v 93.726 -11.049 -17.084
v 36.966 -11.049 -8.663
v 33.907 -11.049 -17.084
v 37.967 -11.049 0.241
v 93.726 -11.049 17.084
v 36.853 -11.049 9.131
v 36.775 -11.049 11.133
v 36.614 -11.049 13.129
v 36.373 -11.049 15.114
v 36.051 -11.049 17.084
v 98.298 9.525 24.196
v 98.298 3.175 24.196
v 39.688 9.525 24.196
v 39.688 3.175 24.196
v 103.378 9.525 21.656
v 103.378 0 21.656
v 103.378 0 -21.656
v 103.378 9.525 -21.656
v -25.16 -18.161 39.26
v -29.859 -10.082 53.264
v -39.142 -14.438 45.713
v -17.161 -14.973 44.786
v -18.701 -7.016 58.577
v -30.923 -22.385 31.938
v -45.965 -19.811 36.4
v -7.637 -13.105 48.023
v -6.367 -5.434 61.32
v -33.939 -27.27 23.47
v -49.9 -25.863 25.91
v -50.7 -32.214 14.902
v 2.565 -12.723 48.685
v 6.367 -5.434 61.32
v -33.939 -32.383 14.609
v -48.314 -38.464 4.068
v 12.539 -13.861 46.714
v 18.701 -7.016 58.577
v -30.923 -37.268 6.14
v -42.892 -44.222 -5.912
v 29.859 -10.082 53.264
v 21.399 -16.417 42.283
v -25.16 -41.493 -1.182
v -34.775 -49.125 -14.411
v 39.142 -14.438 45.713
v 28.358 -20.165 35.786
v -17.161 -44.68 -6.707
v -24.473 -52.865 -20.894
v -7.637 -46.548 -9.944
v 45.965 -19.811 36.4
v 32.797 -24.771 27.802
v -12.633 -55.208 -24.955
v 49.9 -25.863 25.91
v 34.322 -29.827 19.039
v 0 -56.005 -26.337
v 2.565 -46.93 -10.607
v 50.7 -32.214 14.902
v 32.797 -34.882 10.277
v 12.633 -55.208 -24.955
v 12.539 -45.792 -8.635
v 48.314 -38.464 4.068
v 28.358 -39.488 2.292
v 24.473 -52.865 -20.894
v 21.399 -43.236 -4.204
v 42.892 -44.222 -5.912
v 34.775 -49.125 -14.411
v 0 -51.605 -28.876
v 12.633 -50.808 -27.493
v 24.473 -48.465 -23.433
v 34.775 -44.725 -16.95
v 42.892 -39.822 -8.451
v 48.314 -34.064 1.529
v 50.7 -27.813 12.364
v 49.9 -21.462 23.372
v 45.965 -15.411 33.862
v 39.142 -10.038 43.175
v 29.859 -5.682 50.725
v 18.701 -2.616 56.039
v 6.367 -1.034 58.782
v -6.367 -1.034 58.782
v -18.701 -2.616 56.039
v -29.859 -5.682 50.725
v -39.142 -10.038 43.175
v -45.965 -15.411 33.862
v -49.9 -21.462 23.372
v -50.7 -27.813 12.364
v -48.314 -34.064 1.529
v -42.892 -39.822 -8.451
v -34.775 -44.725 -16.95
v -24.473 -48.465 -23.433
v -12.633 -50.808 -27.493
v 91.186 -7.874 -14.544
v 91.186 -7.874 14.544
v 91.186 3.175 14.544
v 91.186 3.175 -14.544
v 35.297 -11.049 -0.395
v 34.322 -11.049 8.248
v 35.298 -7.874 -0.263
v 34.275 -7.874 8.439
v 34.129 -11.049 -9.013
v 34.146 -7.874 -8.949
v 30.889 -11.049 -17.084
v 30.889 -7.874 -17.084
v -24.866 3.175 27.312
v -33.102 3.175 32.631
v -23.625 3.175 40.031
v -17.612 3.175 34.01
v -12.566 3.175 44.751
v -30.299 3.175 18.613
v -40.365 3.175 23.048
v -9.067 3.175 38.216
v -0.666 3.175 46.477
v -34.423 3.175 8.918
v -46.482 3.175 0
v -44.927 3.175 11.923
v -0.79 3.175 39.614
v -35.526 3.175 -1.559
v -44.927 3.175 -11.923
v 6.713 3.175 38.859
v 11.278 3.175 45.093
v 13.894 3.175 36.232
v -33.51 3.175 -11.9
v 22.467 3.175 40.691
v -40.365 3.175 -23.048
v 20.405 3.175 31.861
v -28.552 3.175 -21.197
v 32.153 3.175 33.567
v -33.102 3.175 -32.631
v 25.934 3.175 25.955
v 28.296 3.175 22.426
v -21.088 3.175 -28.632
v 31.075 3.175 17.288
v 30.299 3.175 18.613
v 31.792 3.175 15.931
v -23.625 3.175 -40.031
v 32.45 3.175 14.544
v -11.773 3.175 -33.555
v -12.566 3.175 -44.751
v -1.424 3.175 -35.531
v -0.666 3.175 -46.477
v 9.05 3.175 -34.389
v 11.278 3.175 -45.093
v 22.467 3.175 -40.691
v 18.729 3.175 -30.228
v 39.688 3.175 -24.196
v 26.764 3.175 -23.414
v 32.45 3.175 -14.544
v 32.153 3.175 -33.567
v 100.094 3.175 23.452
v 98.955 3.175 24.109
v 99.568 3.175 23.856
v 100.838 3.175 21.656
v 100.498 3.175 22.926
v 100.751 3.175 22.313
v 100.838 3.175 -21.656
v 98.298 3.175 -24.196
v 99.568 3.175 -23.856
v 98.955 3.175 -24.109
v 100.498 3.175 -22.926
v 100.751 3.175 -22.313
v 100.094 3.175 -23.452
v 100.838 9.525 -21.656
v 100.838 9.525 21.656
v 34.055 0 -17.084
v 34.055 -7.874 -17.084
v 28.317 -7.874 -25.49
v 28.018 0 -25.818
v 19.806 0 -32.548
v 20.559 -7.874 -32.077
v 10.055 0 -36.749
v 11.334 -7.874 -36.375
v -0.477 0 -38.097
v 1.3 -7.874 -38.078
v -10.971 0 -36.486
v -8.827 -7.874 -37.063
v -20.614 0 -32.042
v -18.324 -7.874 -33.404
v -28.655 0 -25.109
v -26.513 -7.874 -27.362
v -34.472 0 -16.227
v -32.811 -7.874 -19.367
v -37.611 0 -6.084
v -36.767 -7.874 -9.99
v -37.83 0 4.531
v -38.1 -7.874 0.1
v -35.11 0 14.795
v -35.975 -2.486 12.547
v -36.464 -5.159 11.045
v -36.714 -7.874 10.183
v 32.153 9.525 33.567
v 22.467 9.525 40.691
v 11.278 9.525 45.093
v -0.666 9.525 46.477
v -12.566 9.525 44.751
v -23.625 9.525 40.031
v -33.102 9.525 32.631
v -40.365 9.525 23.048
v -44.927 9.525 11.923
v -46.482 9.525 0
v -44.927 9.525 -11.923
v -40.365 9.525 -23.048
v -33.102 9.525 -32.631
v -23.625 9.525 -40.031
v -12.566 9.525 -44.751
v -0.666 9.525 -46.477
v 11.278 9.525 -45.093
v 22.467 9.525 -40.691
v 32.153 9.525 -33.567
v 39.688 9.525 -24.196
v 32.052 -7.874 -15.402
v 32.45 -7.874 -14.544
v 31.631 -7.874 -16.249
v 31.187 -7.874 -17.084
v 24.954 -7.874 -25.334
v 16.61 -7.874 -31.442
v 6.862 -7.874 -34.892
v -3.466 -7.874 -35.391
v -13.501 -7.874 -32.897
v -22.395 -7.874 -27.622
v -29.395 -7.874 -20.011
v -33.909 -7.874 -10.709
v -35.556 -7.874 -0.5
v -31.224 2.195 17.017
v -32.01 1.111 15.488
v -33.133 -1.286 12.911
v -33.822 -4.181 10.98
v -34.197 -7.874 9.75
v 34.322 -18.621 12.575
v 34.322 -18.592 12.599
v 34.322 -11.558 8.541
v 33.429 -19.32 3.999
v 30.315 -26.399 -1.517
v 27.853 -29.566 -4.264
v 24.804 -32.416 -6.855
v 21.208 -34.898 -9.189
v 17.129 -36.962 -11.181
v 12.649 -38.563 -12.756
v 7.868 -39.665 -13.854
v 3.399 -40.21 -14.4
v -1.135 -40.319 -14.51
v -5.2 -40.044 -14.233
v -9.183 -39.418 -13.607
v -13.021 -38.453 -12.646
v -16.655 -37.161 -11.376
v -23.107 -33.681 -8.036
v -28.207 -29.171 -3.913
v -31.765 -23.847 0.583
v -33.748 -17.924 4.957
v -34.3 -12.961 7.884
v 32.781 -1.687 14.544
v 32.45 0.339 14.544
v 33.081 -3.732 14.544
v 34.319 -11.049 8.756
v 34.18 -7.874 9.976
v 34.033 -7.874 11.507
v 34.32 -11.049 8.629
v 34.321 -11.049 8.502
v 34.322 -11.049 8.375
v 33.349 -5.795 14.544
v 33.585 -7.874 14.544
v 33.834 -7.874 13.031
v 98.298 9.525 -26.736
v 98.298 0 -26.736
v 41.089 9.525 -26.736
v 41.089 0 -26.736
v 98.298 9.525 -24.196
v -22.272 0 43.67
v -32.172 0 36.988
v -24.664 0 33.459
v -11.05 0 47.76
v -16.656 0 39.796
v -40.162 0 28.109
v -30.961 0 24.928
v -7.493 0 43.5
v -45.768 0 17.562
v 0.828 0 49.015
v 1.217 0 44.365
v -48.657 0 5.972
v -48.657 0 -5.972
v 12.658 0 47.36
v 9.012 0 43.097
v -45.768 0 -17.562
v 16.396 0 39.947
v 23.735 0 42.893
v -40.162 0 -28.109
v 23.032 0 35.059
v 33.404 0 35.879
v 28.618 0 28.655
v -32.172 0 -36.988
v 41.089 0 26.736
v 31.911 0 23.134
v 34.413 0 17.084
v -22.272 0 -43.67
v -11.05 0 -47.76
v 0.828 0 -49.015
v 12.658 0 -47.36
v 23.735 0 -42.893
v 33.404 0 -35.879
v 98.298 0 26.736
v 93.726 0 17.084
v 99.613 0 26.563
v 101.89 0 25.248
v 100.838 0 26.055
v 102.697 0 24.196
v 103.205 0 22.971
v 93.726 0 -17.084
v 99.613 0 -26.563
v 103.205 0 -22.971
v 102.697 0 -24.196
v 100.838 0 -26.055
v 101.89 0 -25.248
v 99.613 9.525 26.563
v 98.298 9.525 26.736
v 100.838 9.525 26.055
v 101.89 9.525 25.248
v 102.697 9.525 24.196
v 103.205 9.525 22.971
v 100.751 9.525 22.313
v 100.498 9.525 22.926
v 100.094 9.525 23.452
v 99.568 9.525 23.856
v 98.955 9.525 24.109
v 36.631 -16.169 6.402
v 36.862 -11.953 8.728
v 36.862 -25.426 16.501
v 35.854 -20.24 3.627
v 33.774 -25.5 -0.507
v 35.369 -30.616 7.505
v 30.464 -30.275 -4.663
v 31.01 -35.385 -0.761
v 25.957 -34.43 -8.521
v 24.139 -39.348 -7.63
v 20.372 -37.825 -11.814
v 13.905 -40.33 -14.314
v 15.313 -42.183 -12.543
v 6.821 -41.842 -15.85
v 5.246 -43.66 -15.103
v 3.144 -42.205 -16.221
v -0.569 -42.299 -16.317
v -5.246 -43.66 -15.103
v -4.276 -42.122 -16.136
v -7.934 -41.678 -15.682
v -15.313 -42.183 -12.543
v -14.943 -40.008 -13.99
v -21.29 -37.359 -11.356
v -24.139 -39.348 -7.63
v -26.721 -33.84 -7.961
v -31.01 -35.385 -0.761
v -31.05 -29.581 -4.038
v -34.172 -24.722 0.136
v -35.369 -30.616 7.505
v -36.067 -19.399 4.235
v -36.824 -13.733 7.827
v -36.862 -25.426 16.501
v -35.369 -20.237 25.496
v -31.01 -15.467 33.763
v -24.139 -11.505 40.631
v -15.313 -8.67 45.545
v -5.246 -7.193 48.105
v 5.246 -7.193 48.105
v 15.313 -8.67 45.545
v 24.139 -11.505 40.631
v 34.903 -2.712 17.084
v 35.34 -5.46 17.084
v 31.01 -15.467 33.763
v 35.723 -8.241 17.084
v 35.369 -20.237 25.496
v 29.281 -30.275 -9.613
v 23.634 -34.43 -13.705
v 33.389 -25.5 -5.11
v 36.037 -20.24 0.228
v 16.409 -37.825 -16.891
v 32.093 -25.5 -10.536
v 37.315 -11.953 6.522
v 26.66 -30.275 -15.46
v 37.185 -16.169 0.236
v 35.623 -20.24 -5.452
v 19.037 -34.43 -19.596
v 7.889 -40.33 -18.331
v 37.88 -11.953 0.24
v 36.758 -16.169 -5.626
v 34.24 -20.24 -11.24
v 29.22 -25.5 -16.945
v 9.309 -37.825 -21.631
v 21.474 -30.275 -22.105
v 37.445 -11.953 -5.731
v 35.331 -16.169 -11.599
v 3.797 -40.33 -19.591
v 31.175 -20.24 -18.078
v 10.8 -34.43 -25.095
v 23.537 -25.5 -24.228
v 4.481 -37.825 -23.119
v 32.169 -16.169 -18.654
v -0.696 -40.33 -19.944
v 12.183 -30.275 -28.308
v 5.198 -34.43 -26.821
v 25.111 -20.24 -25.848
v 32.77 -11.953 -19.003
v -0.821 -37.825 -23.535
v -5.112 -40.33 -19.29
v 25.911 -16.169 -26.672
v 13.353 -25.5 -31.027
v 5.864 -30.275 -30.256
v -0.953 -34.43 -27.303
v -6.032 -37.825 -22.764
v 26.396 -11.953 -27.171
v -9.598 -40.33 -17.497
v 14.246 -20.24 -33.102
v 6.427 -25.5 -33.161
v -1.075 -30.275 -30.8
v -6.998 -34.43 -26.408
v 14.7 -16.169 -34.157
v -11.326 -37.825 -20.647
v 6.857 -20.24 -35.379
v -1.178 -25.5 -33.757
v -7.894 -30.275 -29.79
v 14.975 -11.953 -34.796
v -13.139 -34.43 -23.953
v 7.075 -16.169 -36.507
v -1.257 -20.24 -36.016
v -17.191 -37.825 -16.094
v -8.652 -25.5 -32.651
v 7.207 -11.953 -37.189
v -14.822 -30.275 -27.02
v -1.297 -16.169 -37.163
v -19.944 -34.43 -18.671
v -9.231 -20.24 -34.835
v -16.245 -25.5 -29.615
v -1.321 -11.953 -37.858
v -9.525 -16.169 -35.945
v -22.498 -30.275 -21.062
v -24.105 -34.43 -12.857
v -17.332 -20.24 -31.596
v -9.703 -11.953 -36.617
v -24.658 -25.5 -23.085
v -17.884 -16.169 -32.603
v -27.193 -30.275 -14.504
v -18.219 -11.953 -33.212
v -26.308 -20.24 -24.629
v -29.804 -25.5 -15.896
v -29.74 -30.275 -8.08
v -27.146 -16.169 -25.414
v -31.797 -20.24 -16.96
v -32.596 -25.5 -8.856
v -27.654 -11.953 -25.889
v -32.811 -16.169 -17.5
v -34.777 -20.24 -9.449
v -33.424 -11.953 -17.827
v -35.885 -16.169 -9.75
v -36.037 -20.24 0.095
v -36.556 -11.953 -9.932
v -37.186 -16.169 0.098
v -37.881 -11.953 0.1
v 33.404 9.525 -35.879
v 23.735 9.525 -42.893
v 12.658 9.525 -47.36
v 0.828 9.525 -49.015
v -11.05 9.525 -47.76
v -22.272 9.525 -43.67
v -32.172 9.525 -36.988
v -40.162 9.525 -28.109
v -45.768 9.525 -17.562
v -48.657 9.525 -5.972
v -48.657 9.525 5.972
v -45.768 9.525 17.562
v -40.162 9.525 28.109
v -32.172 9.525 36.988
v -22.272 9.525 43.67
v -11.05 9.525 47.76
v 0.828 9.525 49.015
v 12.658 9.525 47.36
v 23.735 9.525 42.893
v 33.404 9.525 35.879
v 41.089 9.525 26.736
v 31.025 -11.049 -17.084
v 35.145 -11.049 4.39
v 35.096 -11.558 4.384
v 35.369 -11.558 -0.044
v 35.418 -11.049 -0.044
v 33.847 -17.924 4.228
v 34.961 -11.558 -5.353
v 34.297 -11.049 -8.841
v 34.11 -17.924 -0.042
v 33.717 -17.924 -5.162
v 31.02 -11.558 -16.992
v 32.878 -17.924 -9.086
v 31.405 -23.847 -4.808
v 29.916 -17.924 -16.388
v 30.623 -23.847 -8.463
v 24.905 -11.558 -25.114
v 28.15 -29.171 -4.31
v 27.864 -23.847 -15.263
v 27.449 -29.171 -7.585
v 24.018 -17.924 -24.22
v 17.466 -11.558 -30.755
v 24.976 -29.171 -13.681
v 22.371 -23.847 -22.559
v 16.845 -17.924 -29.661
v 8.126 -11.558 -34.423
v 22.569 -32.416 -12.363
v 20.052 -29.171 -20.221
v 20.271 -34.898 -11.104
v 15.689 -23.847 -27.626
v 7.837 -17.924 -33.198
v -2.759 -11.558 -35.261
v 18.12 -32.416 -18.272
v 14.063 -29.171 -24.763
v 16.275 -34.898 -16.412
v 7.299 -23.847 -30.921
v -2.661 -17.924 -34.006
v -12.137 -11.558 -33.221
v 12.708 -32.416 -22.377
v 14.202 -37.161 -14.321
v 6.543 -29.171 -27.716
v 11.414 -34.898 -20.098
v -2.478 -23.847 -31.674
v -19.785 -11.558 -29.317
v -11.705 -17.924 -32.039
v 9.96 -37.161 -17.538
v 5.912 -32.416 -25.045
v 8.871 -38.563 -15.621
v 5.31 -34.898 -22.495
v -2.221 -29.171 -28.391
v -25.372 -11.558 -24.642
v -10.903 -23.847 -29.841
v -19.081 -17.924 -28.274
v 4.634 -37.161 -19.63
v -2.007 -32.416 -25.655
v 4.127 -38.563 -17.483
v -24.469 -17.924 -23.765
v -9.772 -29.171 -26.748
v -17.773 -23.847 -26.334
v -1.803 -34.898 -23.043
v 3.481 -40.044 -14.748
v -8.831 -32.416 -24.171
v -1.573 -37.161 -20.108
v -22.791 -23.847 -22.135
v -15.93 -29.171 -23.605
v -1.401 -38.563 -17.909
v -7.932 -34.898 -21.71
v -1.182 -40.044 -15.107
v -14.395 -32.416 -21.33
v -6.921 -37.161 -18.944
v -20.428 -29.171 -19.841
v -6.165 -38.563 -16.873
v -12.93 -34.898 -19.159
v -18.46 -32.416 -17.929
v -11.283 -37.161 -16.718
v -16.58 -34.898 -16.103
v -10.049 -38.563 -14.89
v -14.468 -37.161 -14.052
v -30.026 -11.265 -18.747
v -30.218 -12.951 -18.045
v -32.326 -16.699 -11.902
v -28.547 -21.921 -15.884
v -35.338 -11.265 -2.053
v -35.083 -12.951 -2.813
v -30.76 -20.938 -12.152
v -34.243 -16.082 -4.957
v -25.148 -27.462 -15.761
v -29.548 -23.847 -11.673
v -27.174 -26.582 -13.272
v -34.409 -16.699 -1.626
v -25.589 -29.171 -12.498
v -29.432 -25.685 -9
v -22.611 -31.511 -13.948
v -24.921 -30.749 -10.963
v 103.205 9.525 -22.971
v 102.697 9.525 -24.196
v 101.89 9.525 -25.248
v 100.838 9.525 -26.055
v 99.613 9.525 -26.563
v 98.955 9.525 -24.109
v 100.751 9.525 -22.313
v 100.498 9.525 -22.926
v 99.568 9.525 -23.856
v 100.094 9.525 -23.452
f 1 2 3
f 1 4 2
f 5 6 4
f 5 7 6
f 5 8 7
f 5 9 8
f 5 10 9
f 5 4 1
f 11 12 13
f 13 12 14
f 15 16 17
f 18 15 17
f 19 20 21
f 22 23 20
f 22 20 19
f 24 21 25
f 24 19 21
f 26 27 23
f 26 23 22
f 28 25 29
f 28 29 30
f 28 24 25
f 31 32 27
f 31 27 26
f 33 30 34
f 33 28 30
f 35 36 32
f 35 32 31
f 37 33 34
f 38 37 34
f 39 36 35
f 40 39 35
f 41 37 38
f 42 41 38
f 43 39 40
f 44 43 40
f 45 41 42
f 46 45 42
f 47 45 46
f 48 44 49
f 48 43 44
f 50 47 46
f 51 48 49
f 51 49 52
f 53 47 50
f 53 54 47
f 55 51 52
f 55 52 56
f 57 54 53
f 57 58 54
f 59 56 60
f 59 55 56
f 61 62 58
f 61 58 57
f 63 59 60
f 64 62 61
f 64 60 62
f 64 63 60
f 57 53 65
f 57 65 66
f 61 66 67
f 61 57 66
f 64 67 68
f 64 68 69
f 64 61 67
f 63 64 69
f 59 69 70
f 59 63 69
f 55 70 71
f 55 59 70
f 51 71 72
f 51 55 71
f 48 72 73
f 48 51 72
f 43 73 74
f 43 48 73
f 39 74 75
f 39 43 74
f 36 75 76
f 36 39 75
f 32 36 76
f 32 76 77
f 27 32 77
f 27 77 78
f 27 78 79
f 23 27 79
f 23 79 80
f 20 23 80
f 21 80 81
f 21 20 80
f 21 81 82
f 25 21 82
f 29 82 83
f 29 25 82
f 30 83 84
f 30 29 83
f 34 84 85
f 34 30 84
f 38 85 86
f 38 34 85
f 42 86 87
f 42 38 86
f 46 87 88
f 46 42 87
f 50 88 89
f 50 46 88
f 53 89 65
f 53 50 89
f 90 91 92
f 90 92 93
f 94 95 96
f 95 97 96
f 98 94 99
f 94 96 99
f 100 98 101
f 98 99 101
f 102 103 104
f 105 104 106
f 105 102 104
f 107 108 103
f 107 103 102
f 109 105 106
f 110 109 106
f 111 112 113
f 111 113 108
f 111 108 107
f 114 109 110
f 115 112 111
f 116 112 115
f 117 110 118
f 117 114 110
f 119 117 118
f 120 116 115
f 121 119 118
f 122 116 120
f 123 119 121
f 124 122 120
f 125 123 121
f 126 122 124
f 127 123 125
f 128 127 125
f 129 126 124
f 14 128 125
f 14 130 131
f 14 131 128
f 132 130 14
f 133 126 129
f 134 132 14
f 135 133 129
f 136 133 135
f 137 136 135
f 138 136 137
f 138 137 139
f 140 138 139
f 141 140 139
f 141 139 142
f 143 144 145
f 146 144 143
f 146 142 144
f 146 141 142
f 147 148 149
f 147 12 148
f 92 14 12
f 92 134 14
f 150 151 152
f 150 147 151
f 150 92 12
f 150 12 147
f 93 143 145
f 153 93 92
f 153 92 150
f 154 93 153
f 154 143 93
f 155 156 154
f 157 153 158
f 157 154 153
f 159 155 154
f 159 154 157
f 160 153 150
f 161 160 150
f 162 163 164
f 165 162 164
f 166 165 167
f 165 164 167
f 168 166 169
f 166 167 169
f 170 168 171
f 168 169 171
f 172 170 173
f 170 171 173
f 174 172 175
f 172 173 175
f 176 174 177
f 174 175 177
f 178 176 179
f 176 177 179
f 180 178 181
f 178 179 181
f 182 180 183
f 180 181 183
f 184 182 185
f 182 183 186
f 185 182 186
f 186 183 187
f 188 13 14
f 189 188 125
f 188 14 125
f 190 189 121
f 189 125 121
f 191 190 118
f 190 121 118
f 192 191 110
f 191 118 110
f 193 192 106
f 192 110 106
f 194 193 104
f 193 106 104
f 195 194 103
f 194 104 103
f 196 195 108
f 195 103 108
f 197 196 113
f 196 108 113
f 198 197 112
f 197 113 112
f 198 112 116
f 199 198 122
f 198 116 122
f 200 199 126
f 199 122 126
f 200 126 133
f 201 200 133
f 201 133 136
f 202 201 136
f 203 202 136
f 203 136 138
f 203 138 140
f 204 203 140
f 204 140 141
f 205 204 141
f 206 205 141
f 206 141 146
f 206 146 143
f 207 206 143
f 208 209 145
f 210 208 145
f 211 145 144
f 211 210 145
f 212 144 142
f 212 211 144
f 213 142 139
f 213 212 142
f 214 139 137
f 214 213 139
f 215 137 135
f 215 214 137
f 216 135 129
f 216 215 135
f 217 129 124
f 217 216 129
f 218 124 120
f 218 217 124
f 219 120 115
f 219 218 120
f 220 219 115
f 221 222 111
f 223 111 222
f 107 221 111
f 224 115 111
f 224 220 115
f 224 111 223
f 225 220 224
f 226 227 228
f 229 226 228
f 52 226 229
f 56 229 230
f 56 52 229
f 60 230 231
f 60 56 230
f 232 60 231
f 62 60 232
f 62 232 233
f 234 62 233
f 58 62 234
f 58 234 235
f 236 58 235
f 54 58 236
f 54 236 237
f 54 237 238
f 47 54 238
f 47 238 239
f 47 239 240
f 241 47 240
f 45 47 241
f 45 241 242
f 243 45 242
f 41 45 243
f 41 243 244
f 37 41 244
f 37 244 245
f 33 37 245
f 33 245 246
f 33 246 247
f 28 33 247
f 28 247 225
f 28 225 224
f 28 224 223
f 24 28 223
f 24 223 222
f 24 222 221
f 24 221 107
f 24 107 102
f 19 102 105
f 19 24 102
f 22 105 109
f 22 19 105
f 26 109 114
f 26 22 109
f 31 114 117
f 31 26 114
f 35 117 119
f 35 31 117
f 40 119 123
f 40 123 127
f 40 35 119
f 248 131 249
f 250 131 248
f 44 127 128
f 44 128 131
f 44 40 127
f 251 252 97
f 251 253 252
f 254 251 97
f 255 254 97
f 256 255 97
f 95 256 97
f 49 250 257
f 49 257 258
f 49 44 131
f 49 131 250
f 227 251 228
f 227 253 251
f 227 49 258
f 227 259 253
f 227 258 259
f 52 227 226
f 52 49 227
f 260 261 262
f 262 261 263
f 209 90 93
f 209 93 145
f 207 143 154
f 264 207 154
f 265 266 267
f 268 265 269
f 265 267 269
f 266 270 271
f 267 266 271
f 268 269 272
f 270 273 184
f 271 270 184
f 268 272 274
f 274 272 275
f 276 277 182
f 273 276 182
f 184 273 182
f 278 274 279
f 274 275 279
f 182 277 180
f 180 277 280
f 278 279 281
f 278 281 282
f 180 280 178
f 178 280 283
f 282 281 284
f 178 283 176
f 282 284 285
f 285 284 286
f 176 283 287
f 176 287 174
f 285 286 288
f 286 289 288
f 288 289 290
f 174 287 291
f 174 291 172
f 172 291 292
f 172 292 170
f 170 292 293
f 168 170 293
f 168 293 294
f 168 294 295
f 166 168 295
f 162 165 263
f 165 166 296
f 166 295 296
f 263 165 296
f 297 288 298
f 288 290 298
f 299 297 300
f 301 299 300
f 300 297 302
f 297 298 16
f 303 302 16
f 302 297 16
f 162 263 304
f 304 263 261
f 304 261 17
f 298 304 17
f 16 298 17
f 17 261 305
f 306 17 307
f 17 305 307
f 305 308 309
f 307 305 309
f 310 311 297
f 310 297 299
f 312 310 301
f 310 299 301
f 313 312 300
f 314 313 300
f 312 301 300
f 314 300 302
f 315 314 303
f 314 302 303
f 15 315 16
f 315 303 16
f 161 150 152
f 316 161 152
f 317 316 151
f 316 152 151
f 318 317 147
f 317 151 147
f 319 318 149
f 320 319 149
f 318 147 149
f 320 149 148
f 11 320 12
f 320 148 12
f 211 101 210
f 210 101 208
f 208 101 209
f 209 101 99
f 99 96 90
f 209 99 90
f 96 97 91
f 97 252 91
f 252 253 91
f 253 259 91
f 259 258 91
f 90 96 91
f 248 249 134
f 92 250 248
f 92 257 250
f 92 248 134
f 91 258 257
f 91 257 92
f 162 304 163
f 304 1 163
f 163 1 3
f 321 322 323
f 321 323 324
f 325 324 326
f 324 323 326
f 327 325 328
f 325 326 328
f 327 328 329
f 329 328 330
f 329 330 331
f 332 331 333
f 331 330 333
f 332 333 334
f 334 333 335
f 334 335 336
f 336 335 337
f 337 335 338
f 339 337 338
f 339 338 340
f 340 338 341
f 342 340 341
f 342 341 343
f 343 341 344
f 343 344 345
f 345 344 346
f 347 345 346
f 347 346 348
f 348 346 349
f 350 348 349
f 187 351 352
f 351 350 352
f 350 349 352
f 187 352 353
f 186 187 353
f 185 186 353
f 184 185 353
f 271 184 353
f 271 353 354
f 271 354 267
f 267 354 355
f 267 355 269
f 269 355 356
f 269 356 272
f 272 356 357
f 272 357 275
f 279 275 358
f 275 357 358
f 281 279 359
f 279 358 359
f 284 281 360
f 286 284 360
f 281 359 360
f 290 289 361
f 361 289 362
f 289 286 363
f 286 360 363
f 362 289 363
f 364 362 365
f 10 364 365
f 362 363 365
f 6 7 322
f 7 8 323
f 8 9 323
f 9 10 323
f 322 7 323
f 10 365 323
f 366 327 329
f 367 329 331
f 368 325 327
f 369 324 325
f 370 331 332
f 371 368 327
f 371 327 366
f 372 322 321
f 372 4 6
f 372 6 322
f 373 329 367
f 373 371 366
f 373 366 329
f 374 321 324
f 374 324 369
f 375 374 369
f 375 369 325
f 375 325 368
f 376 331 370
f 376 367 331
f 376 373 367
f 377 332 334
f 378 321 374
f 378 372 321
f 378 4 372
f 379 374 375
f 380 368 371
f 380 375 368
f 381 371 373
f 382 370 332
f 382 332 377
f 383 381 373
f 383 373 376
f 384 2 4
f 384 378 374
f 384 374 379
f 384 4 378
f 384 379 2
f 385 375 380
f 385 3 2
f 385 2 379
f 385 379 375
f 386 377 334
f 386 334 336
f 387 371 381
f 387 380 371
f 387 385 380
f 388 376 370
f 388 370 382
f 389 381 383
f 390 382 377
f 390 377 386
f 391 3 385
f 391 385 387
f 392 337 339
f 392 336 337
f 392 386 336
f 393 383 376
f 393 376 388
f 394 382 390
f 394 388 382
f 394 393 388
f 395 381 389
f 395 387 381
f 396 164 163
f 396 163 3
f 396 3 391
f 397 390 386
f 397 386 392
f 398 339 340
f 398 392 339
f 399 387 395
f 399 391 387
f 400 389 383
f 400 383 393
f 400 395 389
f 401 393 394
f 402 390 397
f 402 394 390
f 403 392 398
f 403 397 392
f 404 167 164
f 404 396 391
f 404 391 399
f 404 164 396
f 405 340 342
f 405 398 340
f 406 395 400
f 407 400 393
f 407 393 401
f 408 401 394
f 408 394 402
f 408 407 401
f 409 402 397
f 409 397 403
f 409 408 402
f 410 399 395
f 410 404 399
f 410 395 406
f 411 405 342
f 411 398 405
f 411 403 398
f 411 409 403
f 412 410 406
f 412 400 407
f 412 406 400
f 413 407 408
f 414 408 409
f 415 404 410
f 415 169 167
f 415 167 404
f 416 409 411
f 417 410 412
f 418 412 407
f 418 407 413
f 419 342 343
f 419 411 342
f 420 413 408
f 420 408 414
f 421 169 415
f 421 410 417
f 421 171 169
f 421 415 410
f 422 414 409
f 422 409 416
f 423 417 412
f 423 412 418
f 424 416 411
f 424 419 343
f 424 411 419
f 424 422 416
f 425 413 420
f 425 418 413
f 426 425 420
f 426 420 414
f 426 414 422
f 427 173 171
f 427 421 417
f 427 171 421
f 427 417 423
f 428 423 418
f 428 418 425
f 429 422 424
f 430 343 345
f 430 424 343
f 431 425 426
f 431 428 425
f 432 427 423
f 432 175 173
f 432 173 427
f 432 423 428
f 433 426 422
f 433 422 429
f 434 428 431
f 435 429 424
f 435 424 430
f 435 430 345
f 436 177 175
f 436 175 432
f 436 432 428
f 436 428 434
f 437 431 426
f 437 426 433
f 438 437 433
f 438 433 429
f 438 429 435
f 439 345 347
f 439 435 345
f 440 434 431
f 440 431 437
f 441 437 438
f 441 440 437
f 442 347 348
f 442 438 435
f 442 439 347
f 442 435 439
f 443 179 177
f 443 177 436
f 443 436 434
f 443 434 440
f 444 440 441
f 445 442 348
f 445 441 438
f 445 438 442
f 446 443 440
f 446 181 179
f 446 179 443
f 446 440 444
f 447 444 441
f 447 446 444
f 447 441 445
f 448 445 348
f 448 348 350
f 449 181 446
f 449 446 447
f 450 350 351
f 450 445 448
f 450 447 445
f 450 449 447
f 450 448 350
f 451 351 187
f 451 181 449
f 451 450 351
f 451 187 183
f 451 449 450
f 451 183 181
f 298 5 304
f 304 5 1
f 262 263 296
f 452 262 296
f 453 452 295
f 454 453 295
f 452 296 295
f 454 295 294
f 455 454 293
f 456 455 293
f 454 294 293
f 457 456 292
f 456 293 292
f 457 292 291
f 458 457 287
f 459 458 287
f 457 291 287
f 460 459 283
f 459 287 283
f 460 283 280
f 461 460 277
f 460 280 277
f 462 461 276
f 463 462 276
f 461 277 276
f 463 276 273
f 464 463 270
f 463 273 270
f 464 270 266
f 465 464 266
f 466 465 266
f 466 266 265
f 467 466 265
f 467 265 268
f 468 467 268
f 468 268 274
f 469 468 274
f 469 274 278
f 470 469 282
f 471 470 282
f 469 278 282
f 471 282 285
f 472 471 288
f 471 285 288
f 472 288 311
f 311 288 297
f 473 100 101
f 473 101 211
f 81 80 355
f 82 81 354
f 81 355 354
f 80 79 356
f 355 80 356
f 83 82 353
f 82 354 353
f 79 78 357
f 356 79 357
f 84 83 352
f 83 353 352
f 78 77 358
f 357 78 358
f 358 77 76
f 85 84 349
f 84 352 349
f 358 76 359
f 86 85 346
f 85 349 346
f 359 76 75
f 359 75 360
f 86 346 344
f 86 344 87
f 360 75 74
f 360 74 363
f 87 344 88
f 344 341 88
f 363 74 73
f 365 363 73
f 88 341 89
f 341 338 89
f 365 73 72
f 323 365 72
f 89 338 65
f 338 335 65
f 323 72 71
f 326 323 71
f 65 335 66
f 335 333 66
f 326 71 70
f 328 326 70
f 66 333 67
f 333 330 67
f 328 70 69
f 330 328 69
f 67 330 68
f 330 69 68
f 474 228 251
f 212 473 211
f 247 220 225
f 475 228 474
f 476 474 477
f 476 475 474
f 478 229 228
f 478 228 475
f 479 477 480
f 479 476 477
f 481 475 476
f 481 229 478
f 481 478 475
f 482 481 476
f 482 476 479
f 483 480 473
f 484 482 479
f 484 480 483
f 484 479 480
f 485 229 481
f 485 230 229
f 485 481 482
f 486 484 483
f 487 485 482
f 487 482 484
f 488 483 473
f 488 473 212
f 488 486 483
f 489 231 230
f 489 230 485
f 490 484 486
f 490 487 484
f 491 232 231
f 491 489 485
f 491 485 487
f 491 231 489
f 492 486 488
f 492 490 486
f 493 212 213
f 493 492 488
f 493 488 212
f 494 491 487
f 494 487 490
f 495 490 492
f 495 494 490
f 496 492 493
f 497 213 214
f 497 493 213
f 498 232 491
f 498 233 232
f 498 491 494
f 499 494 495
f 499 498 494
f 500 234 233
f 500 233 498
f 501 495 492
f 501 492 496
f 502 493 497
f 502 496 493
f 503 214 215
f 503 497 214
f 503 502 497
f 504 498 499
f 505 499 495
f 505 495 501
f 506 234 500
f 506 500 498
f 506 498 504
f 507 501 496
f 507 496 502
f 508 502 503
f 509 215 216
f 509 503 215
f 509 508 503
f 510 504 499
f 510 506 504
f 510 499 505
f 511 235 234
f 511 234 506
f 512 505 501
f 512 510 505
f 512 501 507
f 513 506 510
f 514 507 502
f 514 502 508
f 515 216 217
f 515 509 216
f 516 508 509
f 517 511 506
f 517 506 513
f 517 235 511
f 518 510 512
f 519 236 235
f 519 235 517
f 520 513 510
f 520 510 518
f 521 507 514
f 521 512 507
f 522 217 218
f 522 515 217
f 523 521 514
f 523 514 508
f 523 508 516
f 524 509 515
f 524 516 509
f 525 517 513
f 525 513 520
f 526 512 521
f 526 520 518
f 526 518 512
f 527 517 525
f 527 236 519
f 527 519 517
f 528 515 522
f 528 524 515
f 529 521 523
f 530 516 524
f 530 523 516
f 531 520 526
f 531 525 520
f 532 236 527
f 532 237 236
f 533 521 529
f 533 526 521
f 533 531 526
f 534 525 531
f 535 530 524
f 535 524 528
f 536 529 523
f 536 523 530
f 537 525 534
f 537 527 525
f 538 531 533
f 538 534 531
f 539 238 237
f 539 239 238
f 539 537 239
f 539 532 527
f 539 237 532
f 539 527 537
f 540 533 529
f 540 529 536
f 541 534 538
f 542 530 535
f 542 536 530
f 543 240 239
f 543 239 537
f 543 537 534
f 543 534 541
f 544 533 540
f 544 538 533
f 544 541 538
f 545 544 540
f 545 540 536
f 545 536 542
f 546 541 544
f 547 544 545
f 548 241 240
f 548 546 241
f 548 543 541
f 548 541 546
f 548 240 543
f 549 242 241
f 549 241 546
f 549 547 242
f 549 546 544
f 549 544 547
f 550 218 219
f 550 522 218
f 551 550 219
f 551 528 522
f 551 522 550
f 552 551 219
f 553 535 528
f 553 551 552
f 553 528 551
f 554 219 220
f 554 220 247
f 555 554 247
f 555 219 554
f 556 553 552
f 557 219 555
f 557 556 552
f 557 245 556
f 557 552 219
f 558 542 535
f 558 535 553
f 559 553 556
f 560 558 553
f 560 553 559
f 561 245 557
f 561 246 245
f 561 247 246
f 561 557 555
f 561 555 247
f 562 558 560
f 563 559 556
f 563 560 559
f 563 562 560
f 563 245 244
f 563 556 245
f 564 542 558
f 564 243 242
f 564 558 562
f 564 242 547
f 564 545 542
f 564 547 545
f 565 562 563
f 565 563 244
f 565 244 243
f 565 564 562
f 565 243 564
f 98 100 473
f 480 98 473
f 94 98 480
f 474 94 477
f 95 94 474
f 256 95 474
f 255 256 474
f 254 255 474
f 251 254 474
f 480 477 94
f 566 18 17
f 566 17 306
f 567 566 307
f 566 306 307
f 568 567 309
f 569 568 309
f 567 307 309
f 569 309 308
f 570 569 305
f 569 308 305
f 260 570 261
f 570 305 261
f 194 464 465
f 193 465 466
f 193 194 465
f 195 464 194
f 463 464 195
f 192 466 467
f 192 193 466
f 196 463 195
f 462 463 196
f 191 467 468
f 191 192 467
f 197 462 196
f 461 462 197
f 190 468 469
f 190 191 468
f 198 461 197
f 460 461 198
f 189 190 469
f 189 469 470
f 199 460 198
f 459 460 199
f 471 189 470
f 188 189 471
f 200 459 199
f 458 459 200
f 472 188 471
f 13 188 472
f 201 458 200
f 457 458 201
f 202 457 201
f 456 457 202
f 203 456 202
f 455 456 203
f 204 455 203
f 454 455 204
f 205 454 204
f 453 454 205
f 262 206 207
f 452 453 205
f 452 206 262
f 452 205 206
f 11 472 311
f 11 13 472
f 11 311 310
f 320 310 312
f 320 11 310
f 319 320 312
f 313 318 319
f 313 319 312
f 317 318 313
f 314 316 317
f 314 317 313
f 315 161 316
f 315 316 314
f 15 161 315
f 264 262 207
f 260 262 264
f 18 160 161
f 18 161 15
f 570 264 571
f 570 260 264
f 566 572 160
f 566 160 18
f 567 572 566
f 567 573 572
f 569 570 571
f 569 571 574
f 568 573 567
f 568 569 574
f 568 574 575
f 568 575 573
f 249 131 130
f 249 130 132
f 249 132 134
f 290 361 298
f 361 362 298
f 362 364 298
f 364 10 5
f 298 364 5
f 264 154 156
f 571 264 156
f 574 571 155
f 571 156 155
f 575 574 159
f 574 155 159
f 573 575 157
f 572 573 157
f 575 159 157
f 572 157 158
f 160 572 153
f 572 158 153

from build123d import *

# Parameters (mm, degrees)
BOSS_EXTRUDE1_DEPTH     = 3.175
EXTRUDE_THIN1_START     = 7.874
EXTRUDE_THIN1_DEPTH     = 7.874
BOSS_EXTRUDE2_DEPTH     = 3.175
EXTRUDE_THIN2_REACH     = 134.494
SKETCH7_R               = 36.861935
SKETCH7_R_2             = 34.321935
CUT_EXTRUDE1_DEPTH      = 44.45
CUT_EXTRUDE1_DEPTH_BACK = 13.335
SKETCH8_R               = 34.321935
SKETCH10_R              = 50.8
SKETCH10_R_2            = 34.321935
BOSS_EXTRUDE3_DEPTH     = 5.08
FILLET1_START           = -1
FILLET1_DEPTH           = 5
BOSS_EXTRUDE4_START     = -3.175
BOSS_EXTRUDE4_DEPTH     = 9.525


with BuildPart() as part:
    # Sketch1 → Boss-Extrude1 (new body)
    with BuildSketch(Plane(origin=(0, 0, 0), x_dir=(1, 0, 0), z_dir=(0, 1, 0))):
        with BuildLine():
            Line((39.687895, -24.196019), (100.838, -24.196019))
            Line((100.838, -24.196019), (100.838, 24.196019))
            Line((100.838, 24.196019), (39.687895, 24.196019))
            ThreePointArc((39.687895, 24.196019), (-46.482, 0), (39.687895, -24.196019))
        make_face()
        with BuildLine():
            Line((32.449732, -14.544019), (91.186, -14.544019))
            Line((91.186, -14.544019), (91.186, 14.544019))
            Line((91.186, 14.544019), (32.449732, 14.544019))
            ThreePointArc((32.449732, 14.544019), (-35.56, 0), (32.449732, -14.544019))
        make_face(mode=Mode.SUBTRACT)
    extrude(amount=BOSS_EXTRUDE1_DEPTH)

    # Sketch4 → Extrude-Thin1 (add)
    with BuildSketch(Plane.XZ.offset(EXTRUDE_THIN1_START)):
        with BuildLine():
            Line((34.055048, 17.084019), (93.726, 17.084019))
            Line((93.726, 17.084019), (93.726, -17.084019))
            Line((93.726, -17.084019), (34.055048, -17.084019))
            ThreePointArc((34.055048, -17.084019), (-38.1, 0), (34.055048, 17.084019))
        make_face()
        with BuildLine():
            Line((32.449732, 14.544019), (91.186, 14.544019))
            Line((91.186, 14.544019), (91.186, -14.544019))
            Line((91.186, -14.544019), (32.449732, -14.544019))
            ThreePointArc((32.449732, -14.544019), (-35.56, 0), (32.449732, 14.544019))
        make_face(mode=Mode.SUBTRACT)
    extrude(amount=-EXTRUDE_THIN1_DEPTH)

    # Sketch5 → Revolve1 (revolve)
    with BuildSketch(Plane.XY):
        with BuildLine():
            Line((0, -43.434), (0, -45.974))
            ThreePointArc((0, -45.974), (-26.940768, -34.814768), (-38.1, -7.874))
            Line((-38.1, -7.874), (-35.56, -7.874))
            ThreePointArc((-35.56, -7.874), (-25.144717, -33.018717), (0, -43.434))
        make_face()
    revolve(axis=Axis((0, -50.818528, 0), (0, 1, 0)))

    # Sketch6 → Boss-Extrude2 (add)
    with BuildSketch(Plane.XZ.offset(7.874)):
        with BuildLine():
            Line((30.889366, -17.084019), (93.726, -17.084019))
            Line((93.726, -17.084019), (93.726, 17.084019))
            Line((93.726, 17.084019), (30.889366, 17.084019))
            ThreePointArc((30.889366, 17.084019), (35.298961, 0), (30.889366, -17.084019))
        make_face()
    extrude(amount=BOSS_EXTRUDE2_DEPTH)

    # Sketch7 → Extrude-Thin2 (add, up to next)
    with BuildSketch(Plane(origin=(0, -20.306958, 35.540261), x_dir=(1, 0, 0), z_dir=(0, 0.8661855860486005, -0.49972245348957706)), mode=Mode.PRIVATE) as extrude_thin2_sk1:
        with Locations((0, 19.05)):
            Circle(SKETCH7_R)
        with Locations((0, 19.05)):
            Circle(SKETCH7_R_2, mode=Mode.SUBTRACT)
    extrude_thin2_tool1 = extrude(extrude_thin2_sk1.sketch, amount=EXTRUDE_THIN2_REACH, mode=Mode.PRIVATE) - part.part
    add(extrude_thin2_tool1.solids().sort_by_distance((-35.819322, -29.826671, 19.039425))[0])

    # Sketch8 → Cut-Extrude1 (cut, two sides: drawn at the far end of the back side and taken through both)
    with BuildSketch(Plane(origin=(0, -20.306958, 35.540261), x_dir=(1, 0, 0), z_dir=(0, 0.8661855860486005, -0.49972245348957706)).offset(-CUT_EXTRUDE1_DEPTH_BACK)):
        with Locations(Location((0, 19.05, 0), (0, 0, 359.940086))):
            Circle(SKETCH8_R)
    extrude(amount=CUT_EXTRUDE1_DEPTH + CUT_EXTRUDE1_DEPTH_BACK, mode=Mode.SUBTRACT)

    # Sketch10 → Boss-Extrude3 (add)
    with BuildSketch(Plane(origin=(0, -30.61954, 17.665119), x_dir=(1, 0, 0), z_dir=(0, -0.8661855860486006, 0.49972245348957695))):
        with Locations(Location((0, 0, 0), (0, 0, 270))):
            Circle(SKETCH10_R)
        with Locations(Location((0, 1.586619, 0), (0, 0, 0.059914))):
            Circle(SKETCH10_R_2, mode=Mode.SUBTRACT)
    extrude(amount=-BOSS_EXTRUDE3_DEPTH)

    # Fillet1: read off the stored shape, not the designer's step
    # Fillet1 outline → Fillet1 (cut)
    with BuildSketch(Plane(origin=(0, 0, 0), x_dir=(1, 0, 0), z_dir=(0, 1, 0)).offset(FILLET1_START)):
        with BuildLine():
            Line((100.838, -24.196019), (100.838, -21.656019))
            ThreePointArc((100.838, -21.656019), (100.094051, -23.45207), (98.298, -24.196019))
            Line((98.298, -24.196019), (100.838, -24.196019))
        make_face()
        with BuildLine():
            ThreePointArc((98.298, 24.196019), (100.094051, 23.45207), (100.838, 21.656019))
            Line((100.838, 21.656019), (100.838, 24.196019))
            Line((100.838, 24.196019), (98.298, 24.196019))
        make_face()
    extrude(amount=FILLET1_DEPTH, mode=Mode.SUBTRACT)

    # Boss-Extrude4: read off the stored shape, not the designer's step
    # Boss-Extrude4 outline → Boss-Extrude4 (add)
    with BuildSketch(Plane(origin=(0, 3.175, 0), x_dir=(1, 0, 0), z_dir=(0, 1, 0)).offset(BOSS_EXTRUDE4_START)):
        with BuildLine():
            ThreePointArc((41.089436, 26.736019), (-49.022, 0), (41.089436, -26.736019))
            Line((41.089436, -26.736019), (98.298, -26.736019))
            ThreePointArc((98.298, -26.736019), (101.890102, -25.248122), (103.378, -21.656019))
            Line((103.378, -21.656019), (103.378, 21.656019))
            ThreePointArc((103.378, 21.656019), (101.890102, 25.248122), (98.298, 26.736019))
            Line((98.298, 26.736019), (41.089436, 26.736019))
        make_face()
        with BuildLine():
            Line((98.298, -24.196019), (39.687895, -24.196019))
            ThreePointArc((39.687895, -24.196019), (-46.482, 0), (39.687895, 24.196019))
            Line((39.687895, 24.196019), (98.298, 24.196019))
            ThreePointArc((98.298, 24.196019), (100.094051, 23.45207), (100.838, 21.656019))
            Line((100.838, 21.656019), (100.838, -21.656019))
            ThreePointArc((100.838, -21.656019), (100.094051, -23.45207), (98.298, -24.196019))
        make_face(mode=Mode.SUBTRACT)
    extrude(amount=BOSS_EXTRUDE4_DEPTH)


solid = part.part
